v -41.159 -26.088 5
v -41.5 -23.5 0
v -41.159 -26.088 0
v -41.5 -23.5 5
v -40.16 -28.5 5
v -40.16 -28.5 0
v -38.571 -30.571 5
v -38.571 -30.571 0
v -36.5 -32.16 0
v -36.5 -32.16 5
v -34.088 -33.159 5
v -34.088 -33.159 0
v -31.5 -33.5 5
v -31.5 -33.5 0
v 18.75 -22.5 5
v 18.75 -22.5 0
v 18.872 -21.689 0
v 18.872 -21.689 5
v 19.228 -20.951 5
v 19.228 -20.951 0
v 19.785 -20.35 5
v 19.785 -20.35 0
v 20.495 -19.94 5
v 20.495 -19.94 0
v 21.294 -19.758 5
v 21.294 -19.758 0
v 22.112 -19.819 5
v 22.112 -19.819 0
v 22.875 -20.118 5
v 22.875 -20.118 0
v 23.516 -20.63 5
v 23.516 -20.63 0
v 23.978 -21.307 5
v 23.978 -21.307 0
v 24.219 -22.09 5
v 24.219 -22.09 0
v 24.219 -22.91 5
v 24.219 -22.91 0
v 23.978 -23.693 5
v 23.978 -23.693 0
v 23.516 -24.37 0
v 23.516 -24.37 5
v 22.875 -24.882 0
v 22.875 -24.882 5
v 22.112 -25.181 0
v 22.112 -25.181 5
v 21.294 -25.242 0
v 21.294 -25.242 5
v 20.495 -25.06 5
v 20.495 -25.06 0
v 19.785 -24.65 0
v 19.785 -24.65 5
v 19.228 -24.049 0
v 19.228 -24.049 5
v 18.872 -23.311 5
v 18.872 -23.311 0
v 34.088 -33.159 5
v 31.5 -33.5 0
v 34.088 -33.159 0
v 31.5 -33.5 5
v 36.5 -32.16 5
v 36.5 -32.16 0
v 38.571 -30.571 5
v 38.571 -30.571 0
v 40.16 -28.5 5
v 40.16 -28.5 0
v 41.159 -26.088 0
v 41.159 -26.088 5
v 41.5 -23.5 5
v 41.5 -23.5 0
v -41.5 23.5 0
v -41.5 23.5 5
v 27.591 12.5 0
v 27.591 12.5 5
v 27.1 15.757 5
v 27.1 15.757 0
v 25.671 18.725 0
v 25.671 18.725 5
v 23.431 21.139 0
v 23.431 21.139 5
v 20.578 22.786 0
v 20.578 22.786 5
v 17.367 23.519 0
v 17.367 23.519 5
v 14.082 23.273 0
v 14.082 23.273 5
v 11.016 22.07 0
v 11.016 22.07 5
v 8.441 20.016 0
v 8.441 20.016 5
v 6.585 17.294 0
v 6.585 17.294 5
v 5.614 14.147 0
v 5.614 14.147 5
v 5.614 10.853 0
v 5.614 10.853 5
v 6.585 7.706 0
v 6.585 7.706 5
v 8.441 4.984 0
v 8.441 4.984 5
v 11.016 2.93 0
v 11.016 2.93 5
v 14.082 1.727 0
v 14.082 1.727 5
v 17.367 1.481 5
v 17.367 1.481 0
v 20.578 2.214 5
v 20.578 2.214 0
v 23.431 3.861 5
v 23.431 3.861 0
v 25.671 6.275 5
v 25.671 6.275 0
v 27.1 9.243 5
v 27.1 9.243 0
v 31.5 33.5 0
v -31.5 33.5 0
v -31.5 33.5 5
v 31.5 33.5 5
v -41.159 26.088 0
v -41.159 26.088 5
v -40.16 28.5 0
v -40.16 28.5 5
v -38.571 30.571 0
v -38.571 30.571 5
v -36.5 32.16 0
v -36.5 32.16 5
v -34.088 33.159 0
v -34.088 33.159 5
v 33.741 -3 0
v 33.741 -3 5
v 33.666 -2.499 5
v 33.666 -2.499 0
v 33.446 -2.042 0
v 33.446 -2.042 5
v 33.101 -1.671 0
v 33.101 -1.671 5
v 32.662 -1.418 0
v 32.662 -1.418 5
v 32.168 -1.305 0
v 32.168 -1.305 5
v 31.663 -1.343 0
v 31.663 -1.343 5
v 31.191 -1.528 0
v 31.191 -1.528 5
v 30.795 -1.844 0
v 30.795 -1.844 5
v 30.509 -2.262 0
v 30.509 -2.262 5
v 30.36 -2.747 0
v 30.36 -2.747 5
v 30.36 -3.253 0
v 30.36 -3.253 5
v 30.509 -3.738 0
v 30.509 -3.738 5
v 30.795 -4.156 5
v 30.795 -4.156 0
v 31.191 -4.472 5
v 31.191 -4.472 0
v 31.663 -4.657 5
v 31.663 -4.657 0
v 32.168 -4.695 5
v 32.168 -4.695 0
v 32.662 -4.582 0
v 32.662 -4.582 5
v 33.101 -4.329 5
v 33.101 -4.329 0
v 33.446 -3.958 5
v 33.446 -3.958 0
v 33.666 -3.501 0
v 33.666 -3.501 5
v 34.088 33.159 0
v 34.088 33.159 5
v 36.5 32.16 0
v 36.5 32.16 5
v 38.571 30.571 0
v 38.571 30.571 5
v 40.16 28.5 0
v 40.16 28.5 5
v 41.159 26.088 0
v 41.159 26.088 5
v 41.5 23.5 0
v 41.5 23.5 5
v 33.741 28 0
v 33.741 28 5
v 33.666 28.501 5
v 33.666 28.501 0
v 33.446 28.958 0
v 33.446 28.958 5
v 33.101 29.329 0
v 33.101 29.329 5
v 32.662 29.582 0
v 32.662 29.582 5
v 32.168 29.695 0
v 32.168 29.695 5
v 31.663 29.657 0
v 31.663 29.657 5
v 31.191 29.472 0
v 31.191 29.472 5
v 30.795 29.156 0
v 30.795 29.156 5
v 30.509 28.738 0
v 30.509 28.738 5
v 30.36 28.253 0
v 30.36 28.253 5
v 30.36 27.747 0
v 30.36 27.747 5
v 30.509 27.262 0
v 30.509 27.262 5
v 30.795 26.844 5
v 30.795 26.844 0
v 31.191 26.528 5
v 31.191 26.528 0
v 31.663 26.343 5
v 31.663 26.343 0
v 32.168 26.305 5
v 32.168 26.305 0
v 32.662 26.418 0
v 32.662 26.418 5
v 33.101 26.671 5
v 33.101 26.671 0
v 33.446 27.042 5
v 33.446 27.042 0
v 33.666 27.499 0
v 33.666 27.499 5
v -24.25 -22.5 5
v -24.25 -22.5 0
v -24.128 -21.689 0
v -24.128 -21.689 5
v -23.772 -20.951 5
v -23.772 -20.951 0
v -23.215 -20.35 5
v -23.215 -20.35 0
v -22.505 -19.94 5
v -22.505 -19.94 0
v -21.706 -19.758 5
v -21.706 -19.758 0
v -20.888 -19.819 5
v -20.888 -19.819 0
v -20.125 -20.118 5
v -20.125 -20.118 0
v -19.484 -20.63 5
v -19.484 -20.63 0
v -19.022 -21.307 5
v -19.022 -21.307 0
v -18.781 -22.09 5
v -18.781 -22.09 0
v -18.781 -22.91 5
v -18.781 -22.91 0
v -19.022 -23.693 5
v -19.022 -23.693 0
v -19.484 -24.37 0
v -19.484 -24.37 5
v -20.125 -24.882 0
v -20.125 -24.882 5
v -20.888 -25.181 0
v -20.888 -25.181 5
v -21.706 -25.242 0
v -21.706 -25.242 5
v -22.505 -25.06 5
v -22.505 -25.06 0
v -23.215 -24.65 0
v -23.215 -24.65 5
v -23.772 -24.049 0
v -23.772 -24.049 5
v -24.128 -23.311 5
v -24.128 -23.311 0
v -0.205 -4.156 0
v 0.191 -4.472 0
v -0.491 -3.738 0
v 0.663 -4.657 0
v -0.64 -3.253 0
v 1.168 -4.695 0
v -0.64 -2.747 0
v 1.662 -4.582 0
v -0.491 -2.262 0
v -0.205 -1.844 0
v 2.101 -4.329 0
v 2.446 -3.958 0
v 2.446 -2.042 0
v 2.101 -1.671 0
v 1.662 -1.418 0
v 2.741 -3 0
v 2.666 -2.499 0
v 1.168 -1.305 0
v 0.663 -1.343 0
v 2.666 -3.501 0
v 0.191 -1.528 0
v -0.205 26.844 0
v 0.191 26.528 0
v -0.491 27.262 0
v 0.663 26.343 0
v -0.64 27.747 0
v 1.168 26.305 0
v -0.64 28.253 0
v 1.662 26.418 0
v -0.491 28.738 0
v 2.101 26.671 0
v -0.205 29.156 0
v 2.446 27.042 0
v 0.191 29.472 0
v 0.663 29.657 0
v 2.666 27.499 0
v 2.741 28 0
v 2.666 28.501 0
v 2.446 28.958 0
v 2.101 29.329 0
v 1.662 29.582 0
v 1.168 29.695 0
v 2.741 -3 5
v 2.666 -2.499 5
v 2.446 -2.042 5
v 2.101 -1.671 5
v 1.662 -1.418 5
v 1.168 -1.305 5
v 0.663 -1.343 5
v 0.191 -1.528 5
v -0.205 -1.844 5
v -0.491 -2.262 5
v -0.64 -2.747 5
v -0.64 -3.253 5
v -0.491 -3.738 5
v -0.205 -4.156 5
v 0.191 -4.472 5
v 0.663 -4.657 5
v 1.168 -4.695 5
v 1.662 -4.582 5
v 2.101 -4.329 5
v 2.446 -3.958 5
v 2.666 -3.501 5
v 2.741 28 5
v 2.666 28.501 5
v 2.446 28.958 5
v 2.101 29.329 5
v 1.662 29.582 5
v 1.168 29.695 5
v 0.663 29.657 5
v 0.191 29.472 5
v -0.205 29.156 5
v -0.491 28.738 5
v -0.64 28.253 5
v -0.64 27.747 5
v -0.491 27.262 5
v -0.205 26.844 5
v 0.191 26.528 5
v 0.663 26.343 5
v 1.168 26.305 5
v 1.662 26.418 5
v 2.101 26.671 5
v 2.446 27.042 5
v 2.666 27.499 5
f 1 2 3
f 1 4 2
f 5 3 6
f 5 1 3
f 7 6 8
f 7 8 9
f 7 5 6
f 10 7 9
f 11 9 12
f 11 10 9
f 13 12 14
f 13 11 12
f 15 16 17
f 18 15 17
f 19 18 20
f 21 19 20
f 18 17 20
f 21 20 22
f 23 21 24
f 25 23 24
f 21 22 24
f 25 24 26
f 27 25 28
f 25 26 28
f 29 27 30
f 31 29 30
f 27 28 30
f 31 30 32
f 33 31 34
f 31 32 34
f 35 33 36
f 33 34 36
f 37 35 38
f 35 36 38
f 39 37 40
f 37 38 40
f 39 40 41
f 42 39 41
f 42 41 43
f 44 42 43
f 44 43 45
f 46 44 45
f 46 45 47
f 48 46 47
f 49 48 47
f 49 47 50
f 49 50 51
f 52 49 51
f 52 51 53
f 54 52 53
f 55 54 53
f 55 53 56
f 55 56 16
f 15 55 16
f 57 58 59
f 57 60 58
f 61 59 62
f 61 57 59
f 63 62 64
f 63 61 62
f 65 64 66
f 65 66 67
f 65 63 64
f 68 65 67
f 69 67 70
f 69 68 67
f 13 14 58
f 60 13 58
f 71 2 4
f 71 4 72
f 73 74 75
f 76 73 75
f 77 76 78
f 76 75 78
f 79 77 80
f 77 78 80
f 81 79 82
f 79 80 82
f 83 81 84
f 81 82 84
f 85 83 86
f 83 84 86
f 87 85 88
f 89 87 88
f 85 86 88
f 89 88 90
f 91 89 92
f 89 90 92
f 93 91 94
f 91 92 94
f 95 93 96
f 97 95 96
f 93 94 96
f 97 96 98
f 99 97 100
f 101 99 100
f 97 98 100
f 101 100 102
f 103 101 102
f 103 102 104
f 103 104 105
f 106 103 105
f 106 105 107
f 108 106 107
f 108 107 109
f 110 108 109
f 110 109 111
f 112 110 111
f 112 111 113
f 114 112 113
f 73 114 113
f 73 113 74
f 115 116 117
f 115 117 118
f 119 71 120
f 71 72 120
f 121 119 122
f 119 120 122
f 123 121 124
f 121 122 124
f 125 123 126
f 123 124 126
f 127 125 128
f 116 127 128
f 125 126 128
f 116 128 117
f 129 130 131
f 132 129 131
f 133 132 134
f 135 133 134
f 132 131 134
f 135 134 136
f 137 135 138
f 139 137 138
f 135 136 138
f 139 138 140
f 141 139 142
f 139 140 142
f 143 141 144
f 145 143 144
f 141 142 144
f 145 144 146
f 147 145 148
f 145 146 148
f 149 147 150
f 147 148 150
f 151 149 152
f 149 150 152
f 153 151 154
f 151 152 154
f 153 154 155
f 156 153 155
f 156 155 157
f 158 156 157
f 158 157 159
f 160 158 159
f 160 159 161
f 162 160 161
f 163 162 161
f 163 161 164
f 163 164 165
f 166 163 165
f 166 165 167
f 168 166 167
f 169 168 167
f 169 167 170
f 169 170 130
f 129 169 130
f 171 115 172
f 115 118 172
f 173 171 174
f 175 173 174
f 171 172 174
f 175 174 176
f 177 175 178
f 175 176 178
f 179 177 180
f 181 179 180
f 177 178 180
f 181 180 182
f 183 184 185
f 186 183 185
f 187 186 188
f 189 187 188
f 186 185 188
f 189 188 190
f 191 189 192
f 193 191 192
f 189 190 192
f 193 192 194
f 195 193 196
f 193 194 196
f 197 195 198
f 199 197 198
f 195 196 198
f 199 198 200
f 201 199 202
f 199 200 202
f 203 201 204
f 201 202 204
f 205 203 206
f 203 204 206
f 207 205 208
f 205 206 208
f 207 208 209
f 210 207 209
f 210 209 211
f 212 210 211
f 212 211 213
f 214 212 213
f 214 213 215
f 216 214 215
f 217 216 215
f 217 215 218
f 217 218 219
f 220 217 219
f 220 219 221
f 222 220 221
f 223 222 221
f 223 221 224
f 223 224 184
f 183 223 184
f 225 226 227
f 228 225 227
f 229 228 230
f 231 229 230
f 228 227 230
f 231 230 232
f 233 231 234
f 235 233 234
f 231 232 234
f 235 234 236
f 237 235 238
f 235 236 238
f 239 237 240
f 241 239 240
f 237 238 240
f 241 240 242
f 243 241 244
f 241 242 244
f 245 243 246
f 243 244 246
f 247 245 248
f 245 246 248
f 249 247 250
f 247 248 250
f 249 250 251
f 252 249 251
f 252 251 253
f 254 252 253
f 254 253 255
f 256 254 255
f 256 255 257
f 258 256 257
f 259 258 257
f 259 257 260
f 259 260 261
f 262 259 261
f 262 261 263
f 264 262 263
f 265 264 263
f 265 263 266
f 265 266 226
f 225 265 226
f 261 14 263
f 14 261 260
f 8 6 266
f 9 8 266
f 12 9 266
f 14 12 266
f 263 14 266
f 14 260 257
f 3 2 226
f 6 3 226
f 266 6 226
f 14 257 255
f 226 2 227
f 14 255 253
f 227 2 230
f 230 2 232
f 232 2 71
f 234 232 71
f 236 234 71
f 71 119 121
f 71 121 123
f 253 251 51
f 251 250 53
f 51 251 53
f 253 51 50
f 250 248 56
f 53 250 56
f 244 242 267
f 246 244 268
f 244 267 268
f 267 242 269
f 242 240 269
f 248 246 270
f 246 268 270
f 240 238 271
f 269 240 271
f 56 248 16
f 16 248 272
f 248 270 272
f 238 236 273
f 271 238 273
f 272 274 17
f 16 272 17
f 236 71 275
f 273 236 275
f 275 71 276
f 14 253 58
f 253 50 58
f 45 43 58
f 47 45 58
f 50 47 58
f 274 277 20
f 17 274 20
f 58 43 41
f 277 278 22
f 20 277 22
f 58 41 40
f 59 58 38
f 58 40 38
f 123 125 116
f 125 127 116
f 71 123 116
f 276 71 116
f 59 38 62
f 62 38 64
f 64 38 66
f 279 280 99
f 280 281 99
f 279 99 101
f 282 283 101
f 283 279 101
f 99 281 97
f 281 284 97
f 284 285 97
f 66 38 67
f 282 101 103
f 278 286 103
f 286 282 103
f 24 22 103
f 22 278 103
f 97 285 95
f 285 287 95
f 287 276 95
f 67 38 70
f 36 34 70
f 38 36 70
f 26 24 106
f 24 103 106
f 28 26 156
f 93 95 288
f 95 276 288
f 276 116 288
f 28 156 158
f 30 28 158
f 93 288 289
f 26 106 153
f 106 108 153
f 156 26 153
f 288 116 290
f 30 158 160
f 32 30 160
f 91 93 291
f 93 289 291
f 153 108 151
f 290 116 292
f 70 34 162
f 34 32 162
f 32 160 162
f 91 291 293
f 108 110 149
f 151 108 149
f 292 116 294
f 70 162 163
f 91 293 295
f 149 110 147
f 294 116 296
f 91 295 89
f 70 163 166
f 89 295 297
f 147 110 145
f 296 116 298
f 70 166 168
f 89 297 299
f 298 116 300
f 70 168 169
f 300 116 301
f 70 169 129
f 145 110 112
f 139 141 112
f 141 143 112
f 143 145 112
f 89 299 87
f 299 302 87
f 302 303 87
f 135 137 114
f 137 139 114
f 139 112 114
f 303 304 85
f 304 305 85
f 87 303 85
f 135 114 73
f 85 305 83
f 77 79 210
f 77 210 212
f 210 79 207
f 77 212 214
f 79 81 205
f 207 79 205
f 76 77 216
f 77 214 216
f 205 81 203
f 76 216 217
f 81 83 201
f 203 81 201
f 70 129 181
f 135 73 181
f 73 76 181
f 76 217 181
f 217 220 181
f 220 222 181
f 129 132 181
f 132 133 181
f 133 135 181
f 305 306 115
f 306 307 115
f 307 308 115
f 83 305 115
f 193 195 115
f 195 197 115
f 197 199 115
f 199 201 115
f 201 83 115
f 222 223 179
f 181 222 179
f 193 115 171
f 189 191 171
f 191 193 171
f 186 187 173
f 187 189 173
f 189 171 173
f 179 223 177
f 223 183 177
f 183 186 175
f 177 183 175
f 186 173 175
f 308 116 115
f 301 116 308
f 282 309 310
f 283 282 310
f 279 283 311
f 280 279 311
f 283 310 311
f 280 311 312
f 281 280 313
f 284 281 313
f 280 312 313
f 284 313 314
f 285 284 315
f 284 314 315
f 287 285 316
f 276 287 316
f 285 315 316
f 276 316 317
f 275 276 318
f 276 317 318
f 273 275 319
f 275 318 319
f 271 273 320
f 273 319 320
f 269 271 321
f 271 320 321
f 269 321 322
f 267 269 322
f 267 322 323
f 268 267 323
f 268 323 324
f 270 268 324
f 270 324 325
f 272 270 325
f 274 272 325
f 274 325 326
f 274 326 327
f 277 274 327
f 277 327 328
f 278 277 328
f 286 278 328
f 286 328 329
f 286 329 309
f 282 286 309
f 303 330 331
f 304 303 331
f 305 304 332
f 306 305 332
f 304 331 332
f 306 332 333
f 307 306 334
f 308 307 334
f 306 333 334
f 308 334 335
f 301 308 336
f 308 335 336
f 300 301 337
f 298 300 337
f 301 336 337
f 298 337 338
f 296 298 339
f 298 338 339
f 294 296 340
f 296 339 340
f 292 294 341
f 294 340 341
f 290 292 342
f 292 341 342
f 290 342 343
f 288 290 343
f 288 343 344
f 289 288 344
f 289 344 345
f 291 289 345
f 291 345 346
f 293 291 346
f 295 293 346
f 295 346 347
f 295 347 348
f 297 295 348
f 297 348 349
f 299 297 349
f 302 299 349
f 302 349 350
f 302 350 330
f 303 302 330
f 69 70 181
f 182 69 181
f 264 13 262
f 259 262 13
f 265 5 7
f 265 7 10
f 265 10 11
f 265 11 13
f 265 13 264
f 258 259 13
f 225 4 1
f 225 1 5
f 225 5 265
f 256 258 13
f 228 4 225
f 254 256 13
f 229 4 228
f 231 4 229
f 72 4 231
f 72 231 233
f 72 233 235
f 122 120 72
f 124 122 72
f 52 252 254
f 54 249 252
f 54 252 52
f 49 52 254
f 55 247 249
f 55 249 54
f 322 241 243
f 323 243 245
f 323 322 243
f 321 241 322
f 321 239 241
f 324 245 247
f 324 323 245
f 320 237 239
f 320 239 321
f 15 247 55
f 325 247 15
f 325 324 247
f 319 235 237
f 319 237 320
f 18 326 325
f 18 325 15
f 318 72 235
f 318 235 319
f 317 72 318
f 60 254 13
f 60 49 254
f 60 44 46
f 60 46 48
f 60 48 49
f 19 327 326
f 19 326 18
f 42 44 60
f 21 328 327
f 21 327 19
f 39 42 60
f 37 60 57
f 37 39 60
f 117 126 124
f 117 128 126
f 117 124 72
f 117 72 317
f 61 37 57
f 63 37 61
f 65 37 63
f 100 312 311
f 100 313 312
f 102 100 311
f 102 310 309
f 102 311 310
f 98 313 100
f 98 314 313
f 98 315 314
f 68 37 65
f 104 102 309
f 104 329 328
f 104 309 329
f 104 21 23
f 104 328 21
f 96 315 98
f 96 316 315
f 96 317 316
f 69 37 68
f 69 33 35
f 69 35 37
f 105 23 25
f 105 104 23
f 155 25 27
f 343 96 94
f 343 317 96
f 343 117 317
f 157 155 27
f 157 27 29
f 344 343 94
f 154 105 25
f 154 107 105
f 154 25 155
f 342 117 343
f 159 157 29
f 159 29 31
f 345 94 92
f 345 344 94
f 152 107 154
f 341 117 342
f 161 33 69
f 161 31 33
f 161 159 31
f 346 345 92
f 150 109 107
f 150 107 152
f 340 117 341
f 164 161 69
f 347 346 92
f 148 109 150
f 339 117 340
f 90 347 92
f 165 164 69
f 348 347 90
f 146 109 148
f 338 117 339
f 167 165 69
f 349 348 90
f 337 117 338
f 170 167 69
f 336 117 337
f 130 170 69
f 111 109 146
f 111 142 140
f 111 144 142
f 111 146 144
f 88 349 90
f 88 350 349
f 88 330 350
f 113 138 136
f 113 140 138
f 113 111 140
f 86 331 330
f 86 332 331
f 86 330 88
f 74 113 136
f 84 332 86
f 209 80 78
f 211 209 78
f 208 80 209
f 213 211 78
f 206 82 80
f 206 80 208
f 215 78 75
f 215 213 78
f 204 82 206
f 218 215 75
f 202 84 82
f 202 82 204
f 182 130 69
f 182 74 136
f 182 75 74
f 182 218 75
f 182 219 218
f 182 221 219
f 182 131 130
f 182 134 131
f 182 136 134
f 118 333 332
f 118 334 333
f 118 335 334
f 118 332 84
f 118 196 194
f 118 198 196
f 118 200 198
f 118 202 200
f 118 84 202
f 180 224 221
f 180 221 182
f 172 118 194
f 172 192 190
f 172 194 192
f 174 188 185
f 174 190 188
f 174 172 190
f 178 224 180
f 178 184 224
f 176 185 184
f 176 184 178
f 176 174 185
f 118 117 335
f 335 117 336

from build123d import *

# Parameters (mm, degrees)
SKETCH1_W            = 83
SKETCH1_H            = 67
BOSS_EXTRUDE1_DEPTH  = 5
M5_CLEARANCE_HOLE1_D = 5.5
M3_CLEARANCE_HOLE1_D = 3.4
SKETCH6_R            = 11.05
CUT_EXTRUDE1_DEPTH   = 6
FILLET1_R            = 10


with BuildPart() as part:
    # Sketch1 → Boss-Extrude1 (new body)
    with BuildSketch(Plane.XY):
        Rectangle(SKETCH1_W, SKETCH1_H)
    extrude(amount=BOSS_EXTRUDE1_DEPTH)

    # M5 Clearance Hole1 (through all)
    with Locations(Plane.XY.offset(5)):
        with Locations((21.5, -22.5), (-21.5, -22.5)):
            Hole(M5_CLEARANCE_HOLE1_D / 2)

    # M3 Clearance Hole1 (through all)
    with Locations(Plane(origin=(0, 0, 0), x_dir=(-1, 0, 0), z_dir=(0, 0, -1))):
        with Locations((-32.041076253, 28.00000478), (-1.041076253, 28.00000478), (-1.041076253, -2.99999522), (-32.041076253, -2.99999522)):
            Hole(M3_CLEARANCE_HOLE1_D / 2)

    # Sketch6 → Cut-Extrude1 (cut, through all)
    with BuildSketch(Plane.XY.offset(5)):
        with Locations((16.541076624, 12.500005008)):
            Circle(SKETCH6_R)
    extrude(amount=-CUT_EXTRUDE1_DEPTH, mode=Mode.SUBTRACT)

    # Fillet1
    fillet1_edges = [part.edges().sort_by_distance(p)[0] for p in [
        (41.5, -33.5, 2.5),
        (-41.5, -33.5, 2.5),
        (-41.5, 33.5, 2.5),
        (41.5, 33.5, 2.5),
    ]]
    fillet(fillet1_edges, radius=FILLET1_R)


solid = part.part
